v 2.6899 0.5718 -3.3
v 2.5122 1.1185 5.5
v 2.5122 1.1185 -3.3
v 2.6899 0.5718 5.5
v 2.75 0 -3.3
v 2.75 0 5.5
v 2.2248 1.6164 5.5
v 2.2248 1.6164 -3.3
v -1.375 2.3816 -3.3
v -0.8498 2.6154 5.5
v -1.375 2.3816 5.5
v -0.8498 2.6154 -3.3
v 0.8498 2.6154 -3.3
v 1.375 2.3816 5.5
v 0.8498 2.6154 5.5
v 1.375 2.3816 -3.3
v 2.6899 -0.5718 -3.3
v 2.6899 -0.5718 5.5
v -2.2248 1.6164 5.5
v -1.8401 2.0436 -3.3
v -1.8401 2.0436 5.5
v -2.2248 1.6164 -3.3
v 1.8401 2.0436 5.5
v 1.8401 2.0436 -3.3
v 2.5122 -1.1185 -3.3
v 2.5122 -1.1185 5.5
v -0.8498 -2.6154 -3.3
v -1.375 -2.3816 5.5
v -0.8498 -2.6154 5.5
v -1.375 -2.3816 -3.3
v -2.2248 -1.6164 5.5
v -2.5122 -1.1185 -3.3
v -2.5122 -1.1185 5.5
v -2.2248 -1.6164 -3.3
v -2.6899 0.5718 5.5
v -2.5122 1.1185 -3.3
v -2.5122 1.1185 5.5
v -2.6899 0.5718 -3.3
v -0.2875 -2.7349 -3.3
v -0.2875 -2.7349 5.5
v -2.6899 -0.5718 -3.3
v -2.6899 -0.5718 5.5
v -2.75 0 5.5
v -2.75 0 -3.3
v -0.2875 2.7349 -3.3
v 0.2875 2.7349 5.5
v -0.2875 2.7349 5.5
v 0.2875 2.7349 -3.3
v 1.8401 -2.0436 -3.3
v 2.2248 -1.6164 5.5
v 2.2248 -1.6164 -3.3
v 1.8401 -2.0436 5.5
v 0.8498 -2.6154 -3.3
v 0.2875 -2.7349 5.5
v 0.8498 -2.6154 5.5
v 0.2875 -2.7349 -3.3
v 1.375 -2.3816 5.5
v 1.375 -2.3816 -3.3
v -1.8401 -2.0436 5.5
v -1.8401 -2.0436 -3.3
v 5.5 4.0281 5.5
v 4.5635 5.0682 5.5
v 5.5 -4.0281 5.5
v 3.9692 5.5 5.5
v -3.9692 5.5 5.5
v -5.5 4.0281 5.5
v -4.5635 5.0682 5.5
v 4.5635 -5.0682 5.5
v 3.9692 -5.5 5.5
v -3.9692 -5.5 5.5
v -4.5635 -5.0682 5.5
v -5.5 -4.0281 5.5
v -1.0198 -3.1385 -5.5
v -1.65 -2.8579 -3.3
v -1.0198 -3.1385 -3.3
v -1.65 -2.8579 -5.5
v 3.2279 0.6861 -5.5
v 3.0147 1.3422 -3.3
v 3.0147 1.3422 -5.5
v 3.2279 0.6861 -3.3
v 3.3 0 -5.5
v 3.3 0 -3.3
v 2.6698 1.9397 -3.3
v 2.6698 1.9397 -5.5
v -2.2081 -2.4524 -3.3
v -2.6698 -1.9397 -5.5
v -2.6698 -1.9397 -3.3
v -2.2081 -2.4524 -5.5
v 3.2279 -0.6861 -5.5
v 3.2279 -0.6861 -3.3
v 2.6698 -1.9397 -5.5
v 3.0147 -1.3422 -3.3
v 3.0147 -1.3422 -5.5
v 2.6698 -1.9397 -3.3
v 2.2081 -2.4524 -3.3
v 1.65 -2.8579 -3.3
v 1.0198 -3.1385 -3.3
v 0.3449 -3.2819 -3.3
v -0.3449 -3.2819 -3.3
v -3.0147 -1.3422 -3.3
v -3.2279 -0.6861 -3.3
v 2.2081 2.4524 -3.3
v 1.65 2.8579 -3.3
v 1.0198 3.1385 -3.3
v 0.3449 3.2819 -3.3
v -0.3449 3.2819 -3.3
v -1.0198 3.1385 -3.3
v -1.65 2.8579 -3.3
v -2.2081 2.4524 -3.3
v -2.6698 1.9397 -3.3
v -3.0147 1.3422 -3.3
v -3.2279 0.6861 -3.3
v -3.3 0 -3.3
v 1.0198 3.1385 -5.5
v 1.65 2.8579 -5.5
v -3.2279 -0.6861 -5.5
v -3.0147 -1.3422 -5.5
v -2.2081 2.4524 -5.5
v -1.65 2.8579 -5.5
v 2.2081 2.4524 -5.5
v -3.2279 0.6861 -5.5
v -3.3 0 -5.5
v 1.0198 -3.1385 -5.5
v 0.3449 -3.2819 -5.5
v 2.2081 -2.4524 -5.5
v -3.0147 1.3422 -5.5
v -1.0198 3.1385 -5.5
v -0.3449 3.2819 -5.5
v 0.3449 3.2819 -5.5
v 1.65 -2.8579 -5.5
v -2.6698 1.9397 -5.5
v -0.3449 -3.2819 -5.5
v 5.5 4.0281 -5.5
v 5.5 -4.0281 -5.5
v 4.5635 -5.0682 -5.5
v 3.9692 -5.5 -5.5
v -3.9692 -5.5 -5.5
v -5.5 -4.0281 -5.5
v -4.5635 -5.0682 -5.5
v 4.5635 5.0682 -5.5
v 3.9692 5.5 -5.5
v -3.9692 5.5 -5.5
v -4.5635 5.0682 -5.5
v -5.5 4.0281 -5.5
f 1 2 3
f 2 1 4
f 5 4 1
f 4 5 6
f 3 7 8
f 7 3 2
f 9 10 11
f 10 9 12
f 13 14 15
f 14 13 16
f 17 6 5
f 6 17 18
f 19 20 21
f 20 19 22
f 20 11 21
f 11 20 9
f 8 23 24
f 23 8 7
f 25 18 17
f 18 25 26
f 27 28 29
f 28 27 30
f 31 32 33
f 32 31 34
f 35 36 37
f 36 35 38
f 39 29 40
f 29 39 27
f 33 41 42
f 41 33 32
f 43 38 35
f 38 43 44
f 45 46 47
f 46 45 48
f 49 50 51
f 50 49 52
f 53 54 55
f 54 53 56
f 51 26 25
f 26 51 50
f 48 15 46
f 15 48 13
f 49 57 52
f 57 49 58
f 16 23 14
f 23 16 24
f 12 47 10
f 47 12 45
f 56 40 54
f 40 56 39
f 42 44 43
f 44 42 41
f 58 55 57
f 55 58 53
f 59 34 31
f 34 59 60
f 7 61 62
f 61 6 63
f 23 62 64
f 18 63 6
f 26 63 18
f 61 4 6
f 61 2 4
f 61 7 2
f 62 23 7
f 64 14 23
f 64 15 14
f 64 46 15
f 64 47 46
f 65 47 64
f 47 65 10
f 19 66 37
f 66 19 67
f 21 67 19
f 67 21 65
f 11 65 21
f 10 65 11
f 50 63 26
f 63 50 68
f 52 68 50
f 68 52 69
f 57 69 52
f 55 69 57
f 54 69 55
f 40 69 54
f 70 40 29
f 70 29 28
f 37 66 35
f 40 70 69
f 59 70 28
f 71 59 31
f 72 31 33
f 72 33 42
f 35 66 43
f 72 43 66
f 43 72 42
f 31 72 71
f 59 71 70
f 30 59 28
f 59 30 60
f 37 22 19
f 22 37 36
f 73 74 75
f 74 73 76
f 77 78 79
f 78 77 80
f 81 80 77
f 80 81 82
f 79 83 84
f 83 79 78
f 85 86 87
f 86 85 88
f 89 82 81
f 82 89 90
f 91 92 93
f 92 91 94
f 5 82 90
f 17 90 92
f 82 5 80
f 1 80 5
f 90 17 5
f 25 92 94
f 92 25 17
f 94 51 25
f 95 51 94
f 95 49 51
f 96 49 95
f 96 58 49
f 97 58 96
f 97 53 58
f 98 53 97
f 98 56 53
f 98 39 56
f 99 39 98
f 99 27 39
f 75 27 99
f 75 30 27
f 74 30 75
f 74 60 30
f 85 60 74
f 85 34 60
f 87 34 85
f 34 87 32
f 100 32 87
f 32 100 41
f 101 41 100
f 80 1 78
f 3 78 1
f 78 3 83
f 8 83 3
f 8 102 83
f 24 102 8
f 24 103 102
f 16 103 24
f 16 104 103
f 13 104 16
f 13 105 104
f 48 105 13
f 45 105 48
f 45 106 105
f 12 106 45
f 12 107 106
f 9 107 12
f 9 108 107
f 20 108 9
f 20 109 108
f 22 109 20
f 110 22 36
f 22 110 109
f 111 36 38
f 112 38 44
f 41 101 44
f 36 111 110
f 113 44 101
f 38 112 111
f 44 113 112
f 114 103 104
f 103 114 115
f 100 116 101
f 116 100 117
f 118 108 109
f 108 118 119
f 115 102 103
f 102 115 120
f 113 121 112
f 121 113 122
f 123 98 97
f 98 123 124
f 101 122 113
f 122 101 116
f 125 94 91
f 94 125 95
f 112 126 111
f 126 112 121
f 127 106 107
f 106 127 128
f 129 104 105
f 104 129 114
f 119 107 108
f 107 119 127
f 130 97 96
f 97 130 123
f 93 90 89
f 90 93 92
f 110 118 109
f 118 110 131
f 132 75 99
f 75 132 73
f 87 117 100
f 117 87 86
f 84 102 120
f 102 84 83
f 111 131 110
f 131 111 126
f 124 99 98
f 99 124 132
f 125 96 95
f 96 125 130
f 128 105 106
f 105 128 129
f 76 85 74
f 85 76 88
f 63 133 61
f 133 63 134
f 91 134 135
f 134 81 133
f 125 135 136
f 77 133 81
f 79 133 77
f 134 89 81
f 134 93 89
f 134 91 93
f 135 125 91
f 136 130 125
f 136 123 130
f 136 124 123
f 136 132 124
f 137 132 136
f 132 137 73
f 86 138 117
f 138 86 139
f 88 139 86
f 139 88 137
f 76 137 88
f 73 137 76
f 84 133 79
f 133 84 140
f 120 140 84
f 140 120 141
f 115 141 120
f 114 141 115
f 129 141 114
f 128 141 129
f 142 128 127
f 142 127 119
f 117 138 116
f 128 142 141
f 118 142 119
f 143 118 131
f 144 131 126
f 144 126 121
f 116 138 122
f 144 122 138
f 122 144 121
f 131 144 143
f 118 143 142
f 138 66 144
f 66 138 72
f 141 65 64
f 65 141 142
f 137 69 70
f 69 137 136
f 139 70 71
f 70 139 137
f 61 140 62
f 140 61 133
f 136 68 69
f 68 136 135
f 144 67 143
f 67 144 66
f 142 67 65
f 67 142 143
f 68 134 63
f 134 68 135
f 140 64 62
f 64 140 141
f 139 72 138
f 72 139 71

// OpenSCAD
$fn = 30;

resize([11,0,0], auto=true) intersection() {
    cylinder(h=15, r=6.2, center=true);
    difference() {
        cube([10,10,10], center=true);
        union() {
            cylinder(h=10, r=2.5, center=true);
            translate([0,0,-6]) cylinder(h=3, r=3);
        }
    }
}
